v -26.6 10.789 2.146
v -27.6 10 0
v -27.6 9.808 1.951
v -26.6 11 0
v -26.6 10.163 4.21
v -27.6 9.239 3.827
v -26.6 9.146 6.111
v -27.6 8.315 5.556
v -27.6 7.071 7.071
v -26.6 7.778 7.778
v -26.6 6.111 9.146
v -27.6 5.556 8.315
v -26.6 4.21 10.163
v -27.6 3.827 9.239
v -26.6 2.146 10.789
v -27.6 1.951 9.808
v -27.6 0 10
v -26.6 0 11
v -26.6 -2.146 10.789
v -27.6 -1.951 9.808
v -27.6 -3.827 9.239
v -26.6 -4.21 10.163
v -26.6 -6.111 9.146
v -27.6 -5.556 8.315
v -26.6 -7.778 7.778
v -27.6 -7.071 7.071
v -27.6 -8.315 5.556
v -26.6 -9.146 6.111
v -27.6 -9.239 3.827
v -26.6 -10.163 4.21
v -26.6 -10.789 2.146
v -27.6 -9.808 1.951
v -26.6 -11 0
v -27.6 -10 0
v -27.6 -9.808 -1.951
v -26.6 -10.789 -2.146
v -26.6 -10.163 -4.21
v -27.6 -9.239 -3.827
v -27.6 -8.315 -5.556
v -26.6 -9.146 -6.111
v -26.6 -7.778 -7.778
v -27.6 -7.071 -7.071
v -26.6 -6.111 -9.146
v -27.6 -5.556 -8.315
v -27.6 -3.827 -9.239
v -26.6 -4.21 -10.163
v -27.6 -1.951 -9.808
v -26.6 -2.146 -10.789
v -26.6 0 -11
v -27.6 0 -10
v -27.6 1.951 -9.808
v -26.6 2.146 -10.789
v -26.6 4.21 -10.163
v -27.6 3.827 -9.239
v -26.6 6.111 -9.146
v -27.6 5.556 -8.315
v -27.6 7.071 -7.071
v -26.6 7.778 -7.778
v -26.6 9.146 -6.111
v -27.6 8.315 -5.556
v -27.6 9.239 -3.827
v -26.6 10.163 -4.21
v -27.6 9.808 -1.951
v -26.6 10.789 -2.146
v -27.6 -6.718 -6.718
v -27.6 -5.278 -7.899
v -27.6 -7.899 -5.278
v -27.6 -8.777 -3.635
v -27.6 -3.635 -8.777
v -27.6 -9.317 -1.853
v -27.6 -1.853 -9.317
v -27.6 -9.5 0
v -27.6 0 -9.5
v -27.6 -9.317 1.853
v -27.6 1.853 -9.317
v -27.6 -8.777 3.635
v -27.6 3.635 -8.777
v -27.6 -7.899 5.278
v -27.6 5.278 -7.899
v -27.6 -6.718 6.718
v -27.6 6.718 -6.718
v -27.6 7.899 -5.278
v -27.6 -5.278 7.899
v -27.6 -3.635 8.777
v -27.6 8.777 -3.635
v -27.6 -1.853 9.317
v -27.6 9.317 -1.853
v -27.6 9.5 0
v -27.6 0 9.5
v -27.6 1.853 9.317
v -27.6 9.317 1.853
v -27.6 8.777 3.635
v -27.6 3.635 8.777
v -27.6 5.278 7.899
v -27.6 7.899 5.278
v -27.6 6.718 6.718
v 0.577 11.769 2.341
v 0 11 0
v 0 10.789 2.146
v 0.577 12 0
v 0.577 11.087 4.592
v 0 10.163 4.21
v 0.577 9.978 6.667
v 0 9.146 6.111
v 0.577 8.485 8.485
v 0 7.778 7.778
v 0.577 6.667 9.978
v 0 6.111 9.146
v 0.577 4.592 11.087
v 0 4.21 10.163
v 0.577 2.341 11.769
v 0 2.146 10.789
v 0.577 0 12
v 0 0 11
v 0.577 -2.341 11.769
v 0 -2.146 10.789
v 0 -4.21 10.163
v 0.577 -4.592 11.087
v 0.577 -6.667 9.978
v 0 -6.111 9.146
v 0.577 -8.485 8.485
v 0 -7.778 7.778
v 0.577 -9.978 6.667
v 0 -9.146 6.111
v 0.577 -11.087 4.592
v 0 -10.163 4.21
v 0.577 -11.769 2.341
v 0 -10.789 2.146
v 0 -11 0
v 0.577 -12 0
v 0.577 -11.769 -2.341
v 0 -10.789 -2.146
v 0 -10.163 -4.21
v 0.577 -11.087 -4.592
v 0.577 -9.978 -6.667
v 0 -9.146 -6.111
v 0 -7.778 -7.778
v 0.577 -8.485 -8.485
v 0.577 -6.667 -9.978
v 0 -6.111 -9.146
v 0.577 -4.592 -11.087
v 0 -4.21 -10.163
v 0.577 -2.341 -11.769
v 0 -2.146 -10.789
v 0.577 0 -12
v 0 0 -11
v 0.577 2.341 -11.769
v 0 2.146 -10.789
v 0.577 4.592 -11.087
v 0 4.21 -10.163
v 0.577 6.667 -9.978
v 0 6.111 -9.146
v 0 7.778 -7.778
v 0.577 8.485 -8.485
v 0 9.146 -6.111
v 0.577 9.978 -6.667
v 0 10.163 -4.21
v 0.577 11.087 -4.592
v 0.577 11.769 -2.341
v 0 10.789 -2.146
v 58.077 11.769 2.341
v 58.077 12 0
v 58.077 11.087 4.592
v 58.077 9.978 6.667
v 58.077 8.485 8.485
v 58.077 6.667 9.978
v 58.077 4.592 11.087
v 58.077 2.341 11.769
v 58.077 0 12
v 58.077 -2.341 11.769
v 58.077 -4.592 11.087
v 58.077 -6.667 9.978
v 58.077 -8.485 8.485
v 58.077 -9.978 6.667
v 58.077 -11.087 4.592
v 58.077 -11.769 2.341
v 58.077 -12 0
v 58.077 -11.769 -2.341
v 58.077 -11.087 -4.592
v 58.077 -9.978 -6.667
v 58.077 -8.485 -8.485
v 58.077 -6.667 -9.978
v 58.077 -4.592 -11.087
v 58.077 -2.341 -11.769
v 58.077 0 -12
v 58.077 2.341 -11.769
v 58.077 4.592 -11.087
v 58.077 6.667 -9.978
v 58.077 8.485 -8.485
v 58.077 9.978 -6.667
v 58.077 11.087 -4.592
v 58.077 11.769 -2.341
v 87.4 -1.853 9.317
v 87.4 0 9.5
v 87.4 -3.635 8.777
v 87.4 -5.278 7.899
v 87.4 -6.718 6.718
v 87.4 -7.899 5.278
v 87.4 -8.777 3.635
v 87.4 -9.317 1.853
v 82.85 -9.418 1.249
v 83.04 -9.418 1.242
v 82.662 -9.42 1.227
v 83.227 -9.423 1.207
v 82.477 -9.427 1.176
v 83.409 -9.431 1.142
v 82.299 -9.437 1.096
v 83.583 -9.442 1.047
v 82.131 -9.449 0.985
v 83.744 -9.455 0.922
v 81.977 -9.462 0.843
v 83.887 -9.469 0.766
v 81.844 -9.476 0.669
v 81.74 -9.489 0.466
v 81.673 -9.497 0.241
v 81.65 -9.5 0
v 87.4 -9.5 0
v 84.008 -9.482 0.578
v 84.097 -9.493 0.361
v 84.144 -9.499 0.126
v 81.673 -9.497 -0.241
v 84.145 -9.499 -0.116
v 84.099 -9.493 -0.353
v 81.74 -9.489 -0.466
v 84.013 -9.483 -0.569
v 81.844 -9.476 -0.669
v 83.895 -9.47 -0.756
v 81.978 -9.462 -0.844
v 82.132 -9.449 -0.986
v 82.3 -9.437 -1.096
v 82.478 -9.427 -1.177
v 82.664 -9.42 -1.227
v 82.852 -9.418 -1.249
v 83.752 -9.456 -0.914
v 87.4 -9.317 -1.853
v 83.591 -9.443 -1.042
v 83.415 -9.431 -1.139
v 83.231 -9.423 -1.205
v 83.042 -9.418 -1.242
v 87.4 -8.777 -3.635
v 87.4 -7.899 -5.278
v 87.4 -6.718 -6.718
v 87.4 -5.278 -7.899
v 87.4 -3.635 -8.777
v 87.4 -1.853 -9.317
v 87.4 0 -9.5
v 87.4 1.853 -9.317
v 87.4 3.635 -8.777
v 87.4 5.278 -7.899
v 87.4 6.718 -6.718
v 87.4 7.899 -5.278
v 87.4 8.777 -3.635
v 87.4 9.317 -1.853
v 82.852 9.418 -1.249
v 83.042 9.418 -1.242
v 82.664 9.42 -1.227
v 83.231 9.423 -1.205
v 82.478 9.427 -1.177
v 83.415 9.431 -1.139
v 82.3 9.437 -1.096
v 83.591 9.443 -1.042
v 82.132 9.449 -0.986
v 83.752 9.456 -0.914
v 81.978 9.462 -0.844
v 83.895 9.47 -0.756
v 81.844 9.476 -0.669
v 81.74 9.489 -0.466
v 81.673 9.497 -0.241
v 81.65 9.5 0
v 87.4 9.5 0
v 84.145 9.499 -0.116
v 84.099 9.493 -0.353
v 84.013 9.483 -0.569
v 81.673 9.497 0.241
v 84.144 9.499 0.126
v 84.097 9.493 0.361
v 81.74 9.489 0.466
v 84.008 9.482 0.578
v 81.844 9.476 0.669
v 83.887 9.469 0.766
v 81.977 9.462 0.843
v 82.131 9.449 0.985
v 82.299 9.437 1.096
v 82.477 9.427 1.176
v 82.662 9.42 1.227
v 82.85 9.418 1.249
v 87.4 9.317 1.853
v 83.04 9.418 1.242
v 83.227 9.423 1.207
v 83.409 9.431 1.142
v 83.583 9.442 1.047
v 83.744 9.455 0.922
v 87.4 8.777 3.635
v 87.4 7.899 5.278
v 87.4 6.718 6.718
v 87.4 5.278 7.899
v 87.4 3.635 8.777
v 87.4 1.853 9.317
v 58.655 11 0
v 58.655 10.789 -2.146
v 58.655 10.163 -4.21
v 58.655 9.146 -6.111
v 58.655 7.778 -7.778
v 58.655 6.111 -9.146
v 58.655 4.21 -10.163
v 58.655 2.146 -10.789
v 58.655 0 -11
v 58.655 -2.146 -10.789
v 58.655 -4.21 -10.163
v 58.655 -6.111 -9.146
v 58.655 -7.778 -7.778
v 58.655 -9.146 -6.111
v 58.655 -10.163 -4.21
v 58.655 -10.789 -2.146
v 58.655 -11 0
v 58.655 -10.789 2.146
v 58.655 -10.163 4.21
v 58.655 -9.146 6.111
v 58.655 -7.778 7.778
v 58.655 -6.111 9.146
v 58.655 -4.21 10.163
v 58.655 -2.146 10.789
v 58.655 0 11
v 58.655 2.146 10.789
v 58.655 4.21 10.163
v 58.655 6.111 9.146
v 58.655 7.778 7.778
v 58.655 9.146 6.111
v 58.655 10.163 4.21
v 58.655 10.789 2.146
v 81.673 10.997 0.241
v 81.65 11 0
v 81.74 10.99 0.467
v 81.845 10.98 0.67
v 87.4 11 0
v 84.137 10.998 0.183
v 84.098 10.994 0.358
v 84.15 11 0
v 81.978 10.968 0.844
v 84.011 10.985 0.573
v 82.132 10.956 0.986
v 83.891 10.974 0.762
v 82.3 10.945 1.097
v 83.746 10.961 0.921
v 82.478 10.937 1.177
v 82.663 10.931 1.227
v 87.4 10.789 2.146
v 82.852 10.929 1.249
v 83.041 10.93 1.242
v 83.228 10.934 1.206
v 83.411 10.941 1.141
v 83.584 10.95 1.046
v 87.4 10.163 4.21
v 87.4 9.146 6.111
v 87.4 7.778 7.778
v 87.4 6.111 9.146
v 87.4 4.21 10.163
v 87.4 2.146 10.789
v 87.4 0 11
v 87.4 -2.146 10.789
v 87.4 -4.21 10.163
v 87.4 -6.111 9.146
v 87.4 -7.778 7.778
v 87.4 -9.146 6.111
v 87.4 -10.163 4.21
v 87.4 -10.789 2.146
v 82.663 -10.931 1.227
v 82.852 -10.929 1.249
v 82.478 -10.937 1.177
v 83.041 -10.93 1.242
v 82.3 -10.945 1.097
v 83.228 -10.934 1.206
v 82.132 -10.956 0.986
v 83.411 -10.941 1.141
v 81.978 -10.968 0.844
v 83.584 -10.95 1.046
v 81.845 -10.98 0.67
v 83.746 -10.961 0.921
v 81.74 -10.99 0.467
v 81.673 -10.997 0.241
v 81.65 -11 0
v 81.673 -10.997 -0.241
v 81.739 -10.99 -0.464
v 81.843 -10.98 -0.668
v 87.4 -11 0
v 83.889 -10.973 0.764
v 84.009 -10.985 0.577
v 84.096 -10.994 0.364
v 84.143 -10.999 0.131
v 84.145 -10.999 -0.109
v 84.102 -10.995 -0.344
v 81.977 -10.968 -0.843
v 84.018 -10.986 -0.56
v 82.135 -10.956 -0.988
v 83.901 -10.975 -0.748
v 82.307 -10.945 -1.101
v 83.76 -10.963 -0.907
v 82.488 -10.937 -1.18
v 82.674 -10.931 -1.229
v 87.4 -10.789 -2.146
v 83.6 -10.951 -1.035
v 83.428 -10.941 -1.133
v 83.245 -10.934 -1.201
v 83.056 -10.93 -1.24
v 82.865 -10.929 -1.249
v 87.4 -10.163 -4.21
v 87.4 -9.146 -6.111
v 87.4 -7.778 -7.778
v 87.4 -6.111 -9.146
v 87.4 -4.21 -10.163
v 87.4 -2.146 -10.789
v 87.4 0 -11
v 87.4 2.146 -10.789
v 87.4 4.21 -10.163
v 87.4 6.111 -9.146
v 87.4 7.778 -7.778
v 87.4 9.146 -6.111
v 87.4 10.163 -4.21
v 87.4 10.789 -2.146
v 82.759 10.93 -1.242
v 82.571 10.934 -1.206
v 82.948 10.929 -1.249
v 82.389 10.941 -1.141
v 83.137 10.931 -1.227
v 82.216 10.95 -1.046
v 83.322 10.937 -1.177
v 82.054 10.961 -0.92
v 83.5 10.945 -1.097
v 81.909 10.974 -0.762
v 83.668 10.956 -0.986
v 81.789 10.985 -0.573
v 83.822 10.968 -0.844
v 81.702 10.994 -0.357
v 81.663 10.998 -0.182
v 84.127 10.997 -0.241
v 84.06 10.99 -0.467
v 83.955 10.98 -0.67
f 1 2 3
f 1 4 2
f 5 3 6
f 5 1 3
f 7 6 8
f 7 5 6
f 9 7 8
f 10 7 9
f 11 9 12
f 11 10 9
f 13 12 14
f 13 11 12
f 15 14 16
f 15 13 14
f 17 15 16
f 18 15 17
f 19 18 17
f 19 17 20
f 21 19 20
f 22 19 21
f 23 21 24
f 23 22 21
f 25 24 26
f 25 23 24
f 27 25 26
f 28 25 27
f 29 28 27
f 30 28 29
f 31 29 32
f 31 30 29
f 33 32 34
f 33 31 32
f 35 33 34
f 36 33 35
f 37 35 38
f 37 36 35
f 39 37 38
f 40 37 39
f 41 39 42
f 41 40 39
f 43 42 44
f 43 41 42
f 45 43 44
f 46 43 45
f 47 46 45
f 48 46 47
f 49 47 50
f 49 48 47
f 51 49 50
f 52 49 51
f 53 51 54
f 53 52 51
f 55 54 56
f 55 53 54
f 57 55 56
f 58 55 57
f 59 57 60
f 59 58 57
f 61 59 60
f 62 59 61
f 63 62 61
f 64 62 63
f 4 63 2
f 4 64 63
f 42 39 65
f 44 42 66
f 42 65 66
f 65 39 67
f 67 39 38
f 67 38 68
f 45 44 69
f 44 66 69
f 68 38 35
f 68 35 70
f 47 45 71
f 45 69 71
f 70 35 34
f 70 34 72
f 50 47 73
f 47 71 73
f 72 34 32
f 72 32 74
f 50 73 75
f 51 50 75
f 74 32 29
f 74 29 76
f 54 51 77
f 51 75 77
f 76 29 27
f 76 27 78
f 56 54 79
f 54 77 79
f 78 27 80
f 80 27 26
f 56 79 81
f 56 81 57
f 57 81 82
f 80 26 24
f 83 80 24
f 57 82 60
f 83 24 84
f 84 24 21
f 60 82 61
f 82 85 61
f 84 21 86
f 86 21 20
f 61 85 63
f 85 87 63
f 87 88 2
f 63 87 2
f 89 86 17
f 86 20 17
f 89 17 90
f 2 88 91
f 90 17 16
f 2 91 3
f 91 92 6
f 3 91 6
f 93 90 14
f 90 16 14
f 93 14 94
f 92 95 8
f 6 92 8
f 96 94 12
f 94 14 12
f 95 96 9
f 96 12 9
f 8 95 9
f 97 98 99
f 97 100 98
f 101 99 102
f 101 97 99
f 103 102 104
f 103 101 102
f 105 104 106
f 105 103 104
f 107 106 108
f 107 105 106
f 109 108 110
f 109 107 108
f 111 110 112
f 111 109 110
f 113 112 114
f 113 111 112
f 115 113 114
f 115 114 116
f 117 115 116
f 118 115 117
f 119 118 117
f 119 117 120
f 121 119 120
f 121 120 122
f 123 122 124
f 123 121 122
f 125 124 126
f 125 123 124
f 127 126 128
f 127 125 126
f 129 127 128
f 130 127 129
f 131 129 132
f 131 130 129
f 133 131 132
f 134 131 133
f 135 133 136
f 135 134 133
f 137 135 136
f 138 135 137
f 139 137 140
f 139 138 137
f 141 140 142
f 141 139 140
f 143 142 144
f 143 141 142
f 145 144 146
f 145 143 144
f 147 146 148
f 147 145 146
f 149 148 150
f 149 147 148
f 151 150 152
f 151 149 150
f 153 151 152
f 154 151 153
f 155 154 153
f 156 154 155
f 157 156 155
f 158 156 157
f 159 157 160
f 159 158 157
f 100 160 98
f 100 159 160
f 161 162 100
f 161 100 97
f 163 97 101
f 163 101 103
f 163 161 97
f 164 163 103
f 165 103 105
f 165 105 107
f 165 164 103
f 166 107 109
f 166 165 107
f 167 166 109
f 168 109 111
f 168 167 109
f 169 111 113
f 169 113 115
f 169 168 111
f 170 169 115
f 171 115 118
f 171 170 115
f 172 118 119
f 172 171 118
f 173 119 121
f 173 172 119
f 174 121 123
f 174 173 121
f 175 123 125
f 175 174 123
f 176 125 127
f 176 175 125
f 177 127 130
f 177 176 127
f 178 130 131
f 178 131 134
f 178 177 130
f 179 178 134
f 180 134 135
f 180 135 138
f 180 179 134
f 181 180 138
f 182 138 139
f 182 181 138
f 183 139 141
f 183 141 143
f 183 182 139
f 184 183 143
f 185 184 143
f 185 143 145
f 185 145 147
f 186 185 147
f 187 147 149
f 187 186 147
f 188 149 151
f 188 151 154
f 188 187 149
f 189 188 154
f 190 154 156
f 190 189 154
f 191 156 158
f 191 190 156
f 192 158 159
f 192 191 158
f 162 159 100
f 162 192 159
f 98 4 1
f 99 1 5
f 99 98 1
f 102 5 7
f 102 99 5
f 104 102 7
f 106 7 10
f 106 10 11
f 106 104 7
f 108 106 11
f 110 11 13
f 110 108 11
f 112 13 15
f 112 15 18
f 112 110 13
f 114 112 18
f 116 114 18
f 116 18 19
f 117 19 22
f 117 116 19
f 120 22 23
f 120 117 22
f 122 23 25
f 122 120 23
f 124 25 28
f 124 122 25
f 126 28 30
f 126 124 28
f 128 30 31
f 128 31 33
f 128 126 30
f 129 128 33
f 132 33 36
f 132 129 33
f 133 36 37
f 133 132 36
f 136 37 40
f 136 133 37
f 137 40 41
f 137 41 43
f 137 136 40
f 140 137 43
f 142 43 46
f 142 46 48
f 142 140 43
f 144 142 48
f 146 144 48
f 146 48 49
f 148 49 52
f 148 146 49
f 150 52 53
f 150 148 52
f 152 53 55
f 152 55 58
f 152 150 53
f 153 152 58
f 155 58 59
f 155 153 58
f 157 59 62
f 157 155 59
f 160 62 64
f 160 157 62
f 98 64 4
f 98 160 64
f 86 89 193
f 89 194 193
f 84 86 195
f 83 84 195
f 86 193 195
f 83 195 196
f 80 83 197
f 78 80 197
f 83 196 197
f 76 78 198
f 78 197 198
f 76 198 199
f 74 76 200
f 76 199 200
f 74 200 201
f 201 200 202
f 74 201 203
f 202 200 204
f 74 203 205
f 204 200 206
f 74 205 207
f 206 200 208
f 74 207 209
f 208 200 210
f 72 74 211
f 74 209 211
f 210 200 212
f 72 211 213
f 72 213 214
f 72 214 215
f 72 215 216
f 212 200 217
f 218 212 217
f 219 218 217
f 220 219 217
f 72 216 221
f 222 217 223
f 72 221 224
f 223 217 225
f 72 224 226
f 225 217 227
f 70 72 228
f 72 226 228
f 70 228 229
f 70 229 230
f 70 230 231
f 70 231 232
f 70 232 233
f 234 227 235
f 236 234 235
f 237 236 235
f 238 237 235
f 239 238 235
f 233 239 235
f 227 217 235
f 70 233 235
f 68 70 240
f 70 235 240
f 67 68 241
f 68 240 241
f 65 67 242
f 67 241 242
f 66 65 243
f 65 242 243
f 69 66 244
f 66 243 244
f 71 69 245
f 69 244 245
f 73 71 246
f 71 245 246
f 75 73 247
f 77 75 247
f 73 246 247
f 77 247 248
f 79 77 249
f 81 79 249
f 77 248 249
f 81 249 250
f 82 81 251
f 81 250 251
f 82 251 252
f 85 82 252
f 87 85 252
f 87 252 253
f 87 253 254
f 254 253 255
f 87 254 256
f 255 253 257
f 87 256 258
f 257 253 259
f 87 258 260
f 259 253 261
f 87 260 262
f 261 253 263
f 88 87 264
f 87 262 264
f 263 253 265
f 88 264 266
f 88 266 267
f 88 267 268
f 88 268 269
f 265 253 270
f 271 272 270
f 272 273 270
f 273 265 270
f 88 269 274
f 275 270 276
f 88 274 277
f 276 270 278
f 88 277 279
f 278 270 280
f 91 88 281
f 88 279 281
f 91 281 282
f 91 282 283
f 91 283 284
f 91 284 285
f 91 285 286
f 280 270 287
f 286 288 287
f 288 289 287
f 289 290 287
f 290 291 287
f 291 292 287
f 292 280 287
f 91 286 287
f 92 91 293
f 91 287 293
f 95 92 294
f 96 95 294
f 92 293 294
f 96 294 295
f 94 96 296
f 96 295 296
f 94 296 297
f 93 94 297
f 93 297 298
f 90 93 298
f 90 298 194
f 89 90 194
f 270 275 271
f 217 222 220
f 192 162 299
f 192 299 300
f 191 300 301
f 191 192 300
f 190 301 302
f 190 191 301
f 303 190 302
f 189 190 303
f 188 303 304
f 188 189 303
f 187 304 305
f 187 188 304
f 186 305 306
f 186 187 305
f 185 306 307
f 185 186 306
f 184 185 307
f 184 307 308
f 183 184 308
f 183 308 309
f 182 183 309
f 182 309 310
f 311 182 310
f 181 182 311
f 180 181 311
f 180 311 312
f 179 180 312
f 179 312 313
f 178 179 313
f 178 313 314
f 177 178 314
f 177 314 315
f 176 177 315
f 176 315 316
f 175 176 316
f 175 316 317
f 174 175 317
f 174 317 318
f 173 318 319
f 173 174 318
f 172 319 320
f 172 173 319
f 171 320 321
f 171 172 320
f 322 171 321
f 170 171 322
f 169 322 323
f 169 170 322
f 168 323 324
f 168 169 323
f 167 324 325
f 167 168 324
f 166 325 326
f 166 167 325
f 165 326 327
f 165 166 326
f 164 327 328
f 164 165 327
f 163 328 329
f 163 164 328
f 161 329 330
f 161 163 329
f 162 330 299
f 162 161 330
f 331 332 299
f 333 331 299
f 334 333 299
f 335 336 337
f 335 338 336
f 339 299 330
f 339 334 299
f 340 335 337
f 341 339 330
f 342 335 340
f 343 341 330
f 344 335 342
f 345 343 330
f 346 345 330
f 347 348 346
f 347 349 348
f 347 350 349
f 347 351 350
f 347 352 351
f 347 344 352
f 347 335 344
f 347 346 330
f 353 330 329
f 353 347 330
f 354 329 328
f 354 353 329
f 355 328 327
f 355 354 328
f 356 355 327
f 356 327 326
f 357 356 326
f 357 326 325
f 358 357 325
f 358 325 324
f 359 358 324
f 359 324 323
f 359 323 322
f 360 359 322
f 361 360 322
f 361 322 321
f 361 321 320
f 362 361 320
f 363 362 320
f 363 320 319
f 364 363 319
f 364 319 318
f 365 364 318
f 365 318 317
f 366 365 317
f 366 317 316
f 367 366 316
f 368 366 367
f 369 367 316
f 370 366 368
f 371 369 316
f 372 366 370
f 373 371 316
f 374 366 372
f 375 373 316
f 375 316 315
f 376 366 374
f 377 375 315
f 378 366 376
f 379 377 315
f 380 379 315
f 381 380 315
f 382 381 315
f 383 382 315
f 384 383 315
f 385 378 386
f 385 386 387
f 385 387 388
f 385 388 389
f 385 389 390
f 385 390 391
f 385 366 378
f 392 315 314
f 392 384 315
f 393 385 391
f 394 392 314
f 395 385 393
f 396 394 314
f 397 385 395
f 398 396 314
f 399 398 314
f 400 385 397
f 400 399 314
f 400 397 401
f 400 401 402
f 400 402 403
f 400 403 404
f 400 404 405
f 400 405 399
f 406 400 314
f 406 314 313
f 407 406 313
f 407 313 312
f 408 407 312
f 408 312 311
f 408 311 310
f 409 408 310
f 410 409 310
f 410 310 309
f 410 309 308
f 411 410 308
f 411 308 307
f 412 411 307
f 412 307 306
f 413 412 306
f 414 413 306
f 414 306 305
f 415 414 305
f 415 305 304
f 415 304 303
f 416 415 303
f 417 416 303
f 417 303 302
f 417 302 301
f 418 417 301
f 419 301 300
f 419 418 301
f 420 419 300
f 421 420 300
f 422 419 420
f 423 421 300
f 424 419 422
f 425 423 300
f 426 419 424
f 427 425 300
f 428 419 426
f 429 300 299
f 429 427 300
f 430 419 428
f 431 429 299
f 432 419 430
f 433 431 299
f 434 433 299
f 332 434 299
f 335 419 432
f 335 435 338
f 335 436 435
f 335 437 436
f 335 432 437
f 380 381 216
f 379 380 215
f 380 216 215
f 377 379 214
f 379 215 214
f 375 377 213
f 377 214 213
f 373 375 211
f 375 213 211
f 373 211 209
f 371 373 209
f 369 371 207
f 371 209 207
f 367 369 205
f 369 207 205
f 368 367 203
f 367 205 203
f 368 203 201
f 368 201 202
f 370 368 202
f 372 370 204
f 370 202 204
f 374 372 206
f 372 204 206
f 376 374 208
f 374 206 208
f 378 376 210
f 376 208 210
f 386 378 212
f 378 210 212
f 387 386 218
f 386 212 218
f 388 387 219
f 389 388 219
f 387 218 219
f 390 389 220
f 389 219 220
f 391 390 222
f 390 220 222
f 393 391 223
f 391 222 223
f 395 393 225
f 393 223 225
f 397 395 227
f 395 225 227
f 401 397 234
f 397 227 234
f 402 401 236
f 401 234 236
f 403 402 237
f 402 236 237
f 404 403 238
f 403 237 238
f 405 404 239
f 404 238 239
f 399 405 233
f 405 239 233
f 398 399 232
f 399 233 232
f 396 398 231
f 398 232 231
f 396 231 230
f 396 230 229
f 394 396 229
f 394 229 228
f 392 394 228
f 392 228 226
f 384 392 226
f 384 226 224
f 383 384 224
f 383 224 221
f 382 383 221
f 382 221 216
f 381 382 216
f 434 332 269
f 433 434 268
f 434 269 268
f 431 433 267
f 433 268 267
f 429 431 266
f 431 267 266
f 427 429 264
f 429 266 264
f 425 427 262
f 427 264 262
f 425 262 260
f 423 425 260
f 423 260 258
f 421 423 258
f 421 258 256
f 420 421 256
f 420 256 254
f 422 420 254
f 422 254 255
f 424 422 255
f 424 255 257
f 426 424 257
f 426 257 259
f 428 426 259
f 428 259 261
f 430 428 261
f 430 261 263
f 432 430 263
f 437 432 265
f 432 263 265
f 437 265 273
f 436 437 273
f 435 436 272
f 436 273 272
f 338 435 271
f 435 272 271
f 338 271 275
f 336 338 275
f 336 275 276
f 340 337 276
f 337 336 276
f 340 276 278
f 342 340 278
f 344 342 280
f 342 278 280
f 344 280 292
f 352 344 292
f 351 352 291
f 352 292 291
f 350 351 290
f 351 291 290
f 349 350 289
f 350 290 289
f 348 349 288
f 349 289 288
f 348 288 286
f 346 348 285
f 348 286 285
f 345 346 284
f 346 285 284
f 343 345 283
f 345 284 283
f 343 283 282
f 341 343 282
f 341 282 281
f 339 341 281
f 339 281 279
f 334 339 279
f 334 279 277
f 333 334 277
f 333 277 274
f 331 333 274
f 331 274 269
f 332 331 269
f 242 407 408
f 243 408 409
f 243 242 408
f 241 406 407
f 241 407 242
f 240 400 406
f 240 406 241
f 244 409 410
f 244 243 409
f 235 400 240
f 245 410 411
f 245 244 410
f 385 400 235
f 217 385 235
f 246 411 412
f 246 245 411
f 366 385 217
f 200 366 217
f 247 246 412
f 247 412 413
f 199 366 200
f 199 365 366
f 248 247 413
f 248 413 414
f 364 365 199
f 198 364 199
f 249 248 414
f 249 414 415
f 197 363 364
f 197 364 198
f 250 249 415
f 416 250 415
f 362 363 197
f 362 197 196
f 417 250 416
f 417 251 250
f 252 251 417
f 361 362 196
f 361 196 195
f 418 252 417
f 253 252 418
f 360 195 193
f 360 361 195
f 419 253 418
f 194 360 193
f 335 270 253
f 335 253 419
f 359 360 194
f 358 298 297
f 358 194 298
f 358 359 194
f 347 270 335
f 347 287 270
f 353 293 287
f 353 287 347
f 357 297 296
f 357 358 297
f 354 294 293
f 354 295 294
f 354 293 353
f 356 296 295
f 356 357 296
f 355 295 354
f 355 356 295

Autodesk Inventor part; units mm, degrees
ref_plane "YZ Plane" through (0, 0, 0) normal (1, 0, 0) x (0, 1, 0)
ref_plane "XZ Plane" through (0, 0, 0) normal (0, 1, 0) x (-1, 0, 0)
ref_plane "XY Plane" through (0, 0, 0) normal (0, 0, 1) x (1, 0, 0)
sketch "Profile" plane through (0, 0, 0) normal (0, 0, 1) x (1, 0, 0)
  line L0 (-27.6, 0) -> (-27.6, 11)
  line L1 (-27.6, 11) -> (0, 11)
  line L2 (0, 11) -> (0.5774, 12)
  line L3 (0.5774, 12) -> (58.0774, 12)
  line L4 (58.0774, 12) -> (58.6547, 11)
  line L5 (58.6547, 11) -> (87.4, 11)
  line L6 (87.4, 11) -> (87.4, 0)
  line L7 (-27.6, 0) -> (0, 0)
  line L8 (0, 0) -> (0, 9)
  line L9 (0, 9) -> (79.4, 9)
  line L10 (79.4, 9) -> (79.4, 0)
  line L11 (79.4, 0) -> (87.4, 0)
  line L12 (-50.6, 0) -> (110.4, 0) construction
  line L13 (0, 11) -> (0, 9) construction
  dimension "BodyLength" = 115
  dimension "d1" = 11
  dimension "d3" = 120
  dimension "d4" = 120
  dimension "d5" = 57.5
  dimension "d6" = 27.6
  dimension "d16" = 8
  dimension "d29" = 1
  dimension "d30" = 9
revolve "ProfileRevolveFeature" add sketch "Profile" angle 360 about axis through (-10, 0, 0) along (1, 0, 0)
sketch "InsideHole" plane through (-27.6, 0, 0) normal (-1, 0, 0) x (0, 0, 1)
  circle A0 centre (0, 0) radius 9 construction
hole "InsideHoleFeature" at (-27.6, 0, 0) direction (1, 0, 0) diameter 19 end through all
chamfer "EndChamferFeature" distance 1 angle 45 1 edges at (-27.6, -11, 0)
sketch "CapMountHole" plane through (0, 0, 0) normal (0, 1, 0) x (-1, 0, 0)
  line L0 (-87.4, 11) -> (-87.4, -11) construction
  line L1 (13.68, 0) -> (-82.08, 0) construction
  circle A0 centre (-82.9, 0) radius 1.25
  point P0 (0, 0)
  dimension "d31" = 4.5
  dimension "d39" = 2.5
extrude "CapMountHoleFeature" cut sketch "CapMountHole" along normal through all both and the other way through all
equation "\"d5\" = 0.5 * BodyLength"
equation "\"d6\" = 0.24 * BodyLength"
properties part number "BackPair1PistonBody"
